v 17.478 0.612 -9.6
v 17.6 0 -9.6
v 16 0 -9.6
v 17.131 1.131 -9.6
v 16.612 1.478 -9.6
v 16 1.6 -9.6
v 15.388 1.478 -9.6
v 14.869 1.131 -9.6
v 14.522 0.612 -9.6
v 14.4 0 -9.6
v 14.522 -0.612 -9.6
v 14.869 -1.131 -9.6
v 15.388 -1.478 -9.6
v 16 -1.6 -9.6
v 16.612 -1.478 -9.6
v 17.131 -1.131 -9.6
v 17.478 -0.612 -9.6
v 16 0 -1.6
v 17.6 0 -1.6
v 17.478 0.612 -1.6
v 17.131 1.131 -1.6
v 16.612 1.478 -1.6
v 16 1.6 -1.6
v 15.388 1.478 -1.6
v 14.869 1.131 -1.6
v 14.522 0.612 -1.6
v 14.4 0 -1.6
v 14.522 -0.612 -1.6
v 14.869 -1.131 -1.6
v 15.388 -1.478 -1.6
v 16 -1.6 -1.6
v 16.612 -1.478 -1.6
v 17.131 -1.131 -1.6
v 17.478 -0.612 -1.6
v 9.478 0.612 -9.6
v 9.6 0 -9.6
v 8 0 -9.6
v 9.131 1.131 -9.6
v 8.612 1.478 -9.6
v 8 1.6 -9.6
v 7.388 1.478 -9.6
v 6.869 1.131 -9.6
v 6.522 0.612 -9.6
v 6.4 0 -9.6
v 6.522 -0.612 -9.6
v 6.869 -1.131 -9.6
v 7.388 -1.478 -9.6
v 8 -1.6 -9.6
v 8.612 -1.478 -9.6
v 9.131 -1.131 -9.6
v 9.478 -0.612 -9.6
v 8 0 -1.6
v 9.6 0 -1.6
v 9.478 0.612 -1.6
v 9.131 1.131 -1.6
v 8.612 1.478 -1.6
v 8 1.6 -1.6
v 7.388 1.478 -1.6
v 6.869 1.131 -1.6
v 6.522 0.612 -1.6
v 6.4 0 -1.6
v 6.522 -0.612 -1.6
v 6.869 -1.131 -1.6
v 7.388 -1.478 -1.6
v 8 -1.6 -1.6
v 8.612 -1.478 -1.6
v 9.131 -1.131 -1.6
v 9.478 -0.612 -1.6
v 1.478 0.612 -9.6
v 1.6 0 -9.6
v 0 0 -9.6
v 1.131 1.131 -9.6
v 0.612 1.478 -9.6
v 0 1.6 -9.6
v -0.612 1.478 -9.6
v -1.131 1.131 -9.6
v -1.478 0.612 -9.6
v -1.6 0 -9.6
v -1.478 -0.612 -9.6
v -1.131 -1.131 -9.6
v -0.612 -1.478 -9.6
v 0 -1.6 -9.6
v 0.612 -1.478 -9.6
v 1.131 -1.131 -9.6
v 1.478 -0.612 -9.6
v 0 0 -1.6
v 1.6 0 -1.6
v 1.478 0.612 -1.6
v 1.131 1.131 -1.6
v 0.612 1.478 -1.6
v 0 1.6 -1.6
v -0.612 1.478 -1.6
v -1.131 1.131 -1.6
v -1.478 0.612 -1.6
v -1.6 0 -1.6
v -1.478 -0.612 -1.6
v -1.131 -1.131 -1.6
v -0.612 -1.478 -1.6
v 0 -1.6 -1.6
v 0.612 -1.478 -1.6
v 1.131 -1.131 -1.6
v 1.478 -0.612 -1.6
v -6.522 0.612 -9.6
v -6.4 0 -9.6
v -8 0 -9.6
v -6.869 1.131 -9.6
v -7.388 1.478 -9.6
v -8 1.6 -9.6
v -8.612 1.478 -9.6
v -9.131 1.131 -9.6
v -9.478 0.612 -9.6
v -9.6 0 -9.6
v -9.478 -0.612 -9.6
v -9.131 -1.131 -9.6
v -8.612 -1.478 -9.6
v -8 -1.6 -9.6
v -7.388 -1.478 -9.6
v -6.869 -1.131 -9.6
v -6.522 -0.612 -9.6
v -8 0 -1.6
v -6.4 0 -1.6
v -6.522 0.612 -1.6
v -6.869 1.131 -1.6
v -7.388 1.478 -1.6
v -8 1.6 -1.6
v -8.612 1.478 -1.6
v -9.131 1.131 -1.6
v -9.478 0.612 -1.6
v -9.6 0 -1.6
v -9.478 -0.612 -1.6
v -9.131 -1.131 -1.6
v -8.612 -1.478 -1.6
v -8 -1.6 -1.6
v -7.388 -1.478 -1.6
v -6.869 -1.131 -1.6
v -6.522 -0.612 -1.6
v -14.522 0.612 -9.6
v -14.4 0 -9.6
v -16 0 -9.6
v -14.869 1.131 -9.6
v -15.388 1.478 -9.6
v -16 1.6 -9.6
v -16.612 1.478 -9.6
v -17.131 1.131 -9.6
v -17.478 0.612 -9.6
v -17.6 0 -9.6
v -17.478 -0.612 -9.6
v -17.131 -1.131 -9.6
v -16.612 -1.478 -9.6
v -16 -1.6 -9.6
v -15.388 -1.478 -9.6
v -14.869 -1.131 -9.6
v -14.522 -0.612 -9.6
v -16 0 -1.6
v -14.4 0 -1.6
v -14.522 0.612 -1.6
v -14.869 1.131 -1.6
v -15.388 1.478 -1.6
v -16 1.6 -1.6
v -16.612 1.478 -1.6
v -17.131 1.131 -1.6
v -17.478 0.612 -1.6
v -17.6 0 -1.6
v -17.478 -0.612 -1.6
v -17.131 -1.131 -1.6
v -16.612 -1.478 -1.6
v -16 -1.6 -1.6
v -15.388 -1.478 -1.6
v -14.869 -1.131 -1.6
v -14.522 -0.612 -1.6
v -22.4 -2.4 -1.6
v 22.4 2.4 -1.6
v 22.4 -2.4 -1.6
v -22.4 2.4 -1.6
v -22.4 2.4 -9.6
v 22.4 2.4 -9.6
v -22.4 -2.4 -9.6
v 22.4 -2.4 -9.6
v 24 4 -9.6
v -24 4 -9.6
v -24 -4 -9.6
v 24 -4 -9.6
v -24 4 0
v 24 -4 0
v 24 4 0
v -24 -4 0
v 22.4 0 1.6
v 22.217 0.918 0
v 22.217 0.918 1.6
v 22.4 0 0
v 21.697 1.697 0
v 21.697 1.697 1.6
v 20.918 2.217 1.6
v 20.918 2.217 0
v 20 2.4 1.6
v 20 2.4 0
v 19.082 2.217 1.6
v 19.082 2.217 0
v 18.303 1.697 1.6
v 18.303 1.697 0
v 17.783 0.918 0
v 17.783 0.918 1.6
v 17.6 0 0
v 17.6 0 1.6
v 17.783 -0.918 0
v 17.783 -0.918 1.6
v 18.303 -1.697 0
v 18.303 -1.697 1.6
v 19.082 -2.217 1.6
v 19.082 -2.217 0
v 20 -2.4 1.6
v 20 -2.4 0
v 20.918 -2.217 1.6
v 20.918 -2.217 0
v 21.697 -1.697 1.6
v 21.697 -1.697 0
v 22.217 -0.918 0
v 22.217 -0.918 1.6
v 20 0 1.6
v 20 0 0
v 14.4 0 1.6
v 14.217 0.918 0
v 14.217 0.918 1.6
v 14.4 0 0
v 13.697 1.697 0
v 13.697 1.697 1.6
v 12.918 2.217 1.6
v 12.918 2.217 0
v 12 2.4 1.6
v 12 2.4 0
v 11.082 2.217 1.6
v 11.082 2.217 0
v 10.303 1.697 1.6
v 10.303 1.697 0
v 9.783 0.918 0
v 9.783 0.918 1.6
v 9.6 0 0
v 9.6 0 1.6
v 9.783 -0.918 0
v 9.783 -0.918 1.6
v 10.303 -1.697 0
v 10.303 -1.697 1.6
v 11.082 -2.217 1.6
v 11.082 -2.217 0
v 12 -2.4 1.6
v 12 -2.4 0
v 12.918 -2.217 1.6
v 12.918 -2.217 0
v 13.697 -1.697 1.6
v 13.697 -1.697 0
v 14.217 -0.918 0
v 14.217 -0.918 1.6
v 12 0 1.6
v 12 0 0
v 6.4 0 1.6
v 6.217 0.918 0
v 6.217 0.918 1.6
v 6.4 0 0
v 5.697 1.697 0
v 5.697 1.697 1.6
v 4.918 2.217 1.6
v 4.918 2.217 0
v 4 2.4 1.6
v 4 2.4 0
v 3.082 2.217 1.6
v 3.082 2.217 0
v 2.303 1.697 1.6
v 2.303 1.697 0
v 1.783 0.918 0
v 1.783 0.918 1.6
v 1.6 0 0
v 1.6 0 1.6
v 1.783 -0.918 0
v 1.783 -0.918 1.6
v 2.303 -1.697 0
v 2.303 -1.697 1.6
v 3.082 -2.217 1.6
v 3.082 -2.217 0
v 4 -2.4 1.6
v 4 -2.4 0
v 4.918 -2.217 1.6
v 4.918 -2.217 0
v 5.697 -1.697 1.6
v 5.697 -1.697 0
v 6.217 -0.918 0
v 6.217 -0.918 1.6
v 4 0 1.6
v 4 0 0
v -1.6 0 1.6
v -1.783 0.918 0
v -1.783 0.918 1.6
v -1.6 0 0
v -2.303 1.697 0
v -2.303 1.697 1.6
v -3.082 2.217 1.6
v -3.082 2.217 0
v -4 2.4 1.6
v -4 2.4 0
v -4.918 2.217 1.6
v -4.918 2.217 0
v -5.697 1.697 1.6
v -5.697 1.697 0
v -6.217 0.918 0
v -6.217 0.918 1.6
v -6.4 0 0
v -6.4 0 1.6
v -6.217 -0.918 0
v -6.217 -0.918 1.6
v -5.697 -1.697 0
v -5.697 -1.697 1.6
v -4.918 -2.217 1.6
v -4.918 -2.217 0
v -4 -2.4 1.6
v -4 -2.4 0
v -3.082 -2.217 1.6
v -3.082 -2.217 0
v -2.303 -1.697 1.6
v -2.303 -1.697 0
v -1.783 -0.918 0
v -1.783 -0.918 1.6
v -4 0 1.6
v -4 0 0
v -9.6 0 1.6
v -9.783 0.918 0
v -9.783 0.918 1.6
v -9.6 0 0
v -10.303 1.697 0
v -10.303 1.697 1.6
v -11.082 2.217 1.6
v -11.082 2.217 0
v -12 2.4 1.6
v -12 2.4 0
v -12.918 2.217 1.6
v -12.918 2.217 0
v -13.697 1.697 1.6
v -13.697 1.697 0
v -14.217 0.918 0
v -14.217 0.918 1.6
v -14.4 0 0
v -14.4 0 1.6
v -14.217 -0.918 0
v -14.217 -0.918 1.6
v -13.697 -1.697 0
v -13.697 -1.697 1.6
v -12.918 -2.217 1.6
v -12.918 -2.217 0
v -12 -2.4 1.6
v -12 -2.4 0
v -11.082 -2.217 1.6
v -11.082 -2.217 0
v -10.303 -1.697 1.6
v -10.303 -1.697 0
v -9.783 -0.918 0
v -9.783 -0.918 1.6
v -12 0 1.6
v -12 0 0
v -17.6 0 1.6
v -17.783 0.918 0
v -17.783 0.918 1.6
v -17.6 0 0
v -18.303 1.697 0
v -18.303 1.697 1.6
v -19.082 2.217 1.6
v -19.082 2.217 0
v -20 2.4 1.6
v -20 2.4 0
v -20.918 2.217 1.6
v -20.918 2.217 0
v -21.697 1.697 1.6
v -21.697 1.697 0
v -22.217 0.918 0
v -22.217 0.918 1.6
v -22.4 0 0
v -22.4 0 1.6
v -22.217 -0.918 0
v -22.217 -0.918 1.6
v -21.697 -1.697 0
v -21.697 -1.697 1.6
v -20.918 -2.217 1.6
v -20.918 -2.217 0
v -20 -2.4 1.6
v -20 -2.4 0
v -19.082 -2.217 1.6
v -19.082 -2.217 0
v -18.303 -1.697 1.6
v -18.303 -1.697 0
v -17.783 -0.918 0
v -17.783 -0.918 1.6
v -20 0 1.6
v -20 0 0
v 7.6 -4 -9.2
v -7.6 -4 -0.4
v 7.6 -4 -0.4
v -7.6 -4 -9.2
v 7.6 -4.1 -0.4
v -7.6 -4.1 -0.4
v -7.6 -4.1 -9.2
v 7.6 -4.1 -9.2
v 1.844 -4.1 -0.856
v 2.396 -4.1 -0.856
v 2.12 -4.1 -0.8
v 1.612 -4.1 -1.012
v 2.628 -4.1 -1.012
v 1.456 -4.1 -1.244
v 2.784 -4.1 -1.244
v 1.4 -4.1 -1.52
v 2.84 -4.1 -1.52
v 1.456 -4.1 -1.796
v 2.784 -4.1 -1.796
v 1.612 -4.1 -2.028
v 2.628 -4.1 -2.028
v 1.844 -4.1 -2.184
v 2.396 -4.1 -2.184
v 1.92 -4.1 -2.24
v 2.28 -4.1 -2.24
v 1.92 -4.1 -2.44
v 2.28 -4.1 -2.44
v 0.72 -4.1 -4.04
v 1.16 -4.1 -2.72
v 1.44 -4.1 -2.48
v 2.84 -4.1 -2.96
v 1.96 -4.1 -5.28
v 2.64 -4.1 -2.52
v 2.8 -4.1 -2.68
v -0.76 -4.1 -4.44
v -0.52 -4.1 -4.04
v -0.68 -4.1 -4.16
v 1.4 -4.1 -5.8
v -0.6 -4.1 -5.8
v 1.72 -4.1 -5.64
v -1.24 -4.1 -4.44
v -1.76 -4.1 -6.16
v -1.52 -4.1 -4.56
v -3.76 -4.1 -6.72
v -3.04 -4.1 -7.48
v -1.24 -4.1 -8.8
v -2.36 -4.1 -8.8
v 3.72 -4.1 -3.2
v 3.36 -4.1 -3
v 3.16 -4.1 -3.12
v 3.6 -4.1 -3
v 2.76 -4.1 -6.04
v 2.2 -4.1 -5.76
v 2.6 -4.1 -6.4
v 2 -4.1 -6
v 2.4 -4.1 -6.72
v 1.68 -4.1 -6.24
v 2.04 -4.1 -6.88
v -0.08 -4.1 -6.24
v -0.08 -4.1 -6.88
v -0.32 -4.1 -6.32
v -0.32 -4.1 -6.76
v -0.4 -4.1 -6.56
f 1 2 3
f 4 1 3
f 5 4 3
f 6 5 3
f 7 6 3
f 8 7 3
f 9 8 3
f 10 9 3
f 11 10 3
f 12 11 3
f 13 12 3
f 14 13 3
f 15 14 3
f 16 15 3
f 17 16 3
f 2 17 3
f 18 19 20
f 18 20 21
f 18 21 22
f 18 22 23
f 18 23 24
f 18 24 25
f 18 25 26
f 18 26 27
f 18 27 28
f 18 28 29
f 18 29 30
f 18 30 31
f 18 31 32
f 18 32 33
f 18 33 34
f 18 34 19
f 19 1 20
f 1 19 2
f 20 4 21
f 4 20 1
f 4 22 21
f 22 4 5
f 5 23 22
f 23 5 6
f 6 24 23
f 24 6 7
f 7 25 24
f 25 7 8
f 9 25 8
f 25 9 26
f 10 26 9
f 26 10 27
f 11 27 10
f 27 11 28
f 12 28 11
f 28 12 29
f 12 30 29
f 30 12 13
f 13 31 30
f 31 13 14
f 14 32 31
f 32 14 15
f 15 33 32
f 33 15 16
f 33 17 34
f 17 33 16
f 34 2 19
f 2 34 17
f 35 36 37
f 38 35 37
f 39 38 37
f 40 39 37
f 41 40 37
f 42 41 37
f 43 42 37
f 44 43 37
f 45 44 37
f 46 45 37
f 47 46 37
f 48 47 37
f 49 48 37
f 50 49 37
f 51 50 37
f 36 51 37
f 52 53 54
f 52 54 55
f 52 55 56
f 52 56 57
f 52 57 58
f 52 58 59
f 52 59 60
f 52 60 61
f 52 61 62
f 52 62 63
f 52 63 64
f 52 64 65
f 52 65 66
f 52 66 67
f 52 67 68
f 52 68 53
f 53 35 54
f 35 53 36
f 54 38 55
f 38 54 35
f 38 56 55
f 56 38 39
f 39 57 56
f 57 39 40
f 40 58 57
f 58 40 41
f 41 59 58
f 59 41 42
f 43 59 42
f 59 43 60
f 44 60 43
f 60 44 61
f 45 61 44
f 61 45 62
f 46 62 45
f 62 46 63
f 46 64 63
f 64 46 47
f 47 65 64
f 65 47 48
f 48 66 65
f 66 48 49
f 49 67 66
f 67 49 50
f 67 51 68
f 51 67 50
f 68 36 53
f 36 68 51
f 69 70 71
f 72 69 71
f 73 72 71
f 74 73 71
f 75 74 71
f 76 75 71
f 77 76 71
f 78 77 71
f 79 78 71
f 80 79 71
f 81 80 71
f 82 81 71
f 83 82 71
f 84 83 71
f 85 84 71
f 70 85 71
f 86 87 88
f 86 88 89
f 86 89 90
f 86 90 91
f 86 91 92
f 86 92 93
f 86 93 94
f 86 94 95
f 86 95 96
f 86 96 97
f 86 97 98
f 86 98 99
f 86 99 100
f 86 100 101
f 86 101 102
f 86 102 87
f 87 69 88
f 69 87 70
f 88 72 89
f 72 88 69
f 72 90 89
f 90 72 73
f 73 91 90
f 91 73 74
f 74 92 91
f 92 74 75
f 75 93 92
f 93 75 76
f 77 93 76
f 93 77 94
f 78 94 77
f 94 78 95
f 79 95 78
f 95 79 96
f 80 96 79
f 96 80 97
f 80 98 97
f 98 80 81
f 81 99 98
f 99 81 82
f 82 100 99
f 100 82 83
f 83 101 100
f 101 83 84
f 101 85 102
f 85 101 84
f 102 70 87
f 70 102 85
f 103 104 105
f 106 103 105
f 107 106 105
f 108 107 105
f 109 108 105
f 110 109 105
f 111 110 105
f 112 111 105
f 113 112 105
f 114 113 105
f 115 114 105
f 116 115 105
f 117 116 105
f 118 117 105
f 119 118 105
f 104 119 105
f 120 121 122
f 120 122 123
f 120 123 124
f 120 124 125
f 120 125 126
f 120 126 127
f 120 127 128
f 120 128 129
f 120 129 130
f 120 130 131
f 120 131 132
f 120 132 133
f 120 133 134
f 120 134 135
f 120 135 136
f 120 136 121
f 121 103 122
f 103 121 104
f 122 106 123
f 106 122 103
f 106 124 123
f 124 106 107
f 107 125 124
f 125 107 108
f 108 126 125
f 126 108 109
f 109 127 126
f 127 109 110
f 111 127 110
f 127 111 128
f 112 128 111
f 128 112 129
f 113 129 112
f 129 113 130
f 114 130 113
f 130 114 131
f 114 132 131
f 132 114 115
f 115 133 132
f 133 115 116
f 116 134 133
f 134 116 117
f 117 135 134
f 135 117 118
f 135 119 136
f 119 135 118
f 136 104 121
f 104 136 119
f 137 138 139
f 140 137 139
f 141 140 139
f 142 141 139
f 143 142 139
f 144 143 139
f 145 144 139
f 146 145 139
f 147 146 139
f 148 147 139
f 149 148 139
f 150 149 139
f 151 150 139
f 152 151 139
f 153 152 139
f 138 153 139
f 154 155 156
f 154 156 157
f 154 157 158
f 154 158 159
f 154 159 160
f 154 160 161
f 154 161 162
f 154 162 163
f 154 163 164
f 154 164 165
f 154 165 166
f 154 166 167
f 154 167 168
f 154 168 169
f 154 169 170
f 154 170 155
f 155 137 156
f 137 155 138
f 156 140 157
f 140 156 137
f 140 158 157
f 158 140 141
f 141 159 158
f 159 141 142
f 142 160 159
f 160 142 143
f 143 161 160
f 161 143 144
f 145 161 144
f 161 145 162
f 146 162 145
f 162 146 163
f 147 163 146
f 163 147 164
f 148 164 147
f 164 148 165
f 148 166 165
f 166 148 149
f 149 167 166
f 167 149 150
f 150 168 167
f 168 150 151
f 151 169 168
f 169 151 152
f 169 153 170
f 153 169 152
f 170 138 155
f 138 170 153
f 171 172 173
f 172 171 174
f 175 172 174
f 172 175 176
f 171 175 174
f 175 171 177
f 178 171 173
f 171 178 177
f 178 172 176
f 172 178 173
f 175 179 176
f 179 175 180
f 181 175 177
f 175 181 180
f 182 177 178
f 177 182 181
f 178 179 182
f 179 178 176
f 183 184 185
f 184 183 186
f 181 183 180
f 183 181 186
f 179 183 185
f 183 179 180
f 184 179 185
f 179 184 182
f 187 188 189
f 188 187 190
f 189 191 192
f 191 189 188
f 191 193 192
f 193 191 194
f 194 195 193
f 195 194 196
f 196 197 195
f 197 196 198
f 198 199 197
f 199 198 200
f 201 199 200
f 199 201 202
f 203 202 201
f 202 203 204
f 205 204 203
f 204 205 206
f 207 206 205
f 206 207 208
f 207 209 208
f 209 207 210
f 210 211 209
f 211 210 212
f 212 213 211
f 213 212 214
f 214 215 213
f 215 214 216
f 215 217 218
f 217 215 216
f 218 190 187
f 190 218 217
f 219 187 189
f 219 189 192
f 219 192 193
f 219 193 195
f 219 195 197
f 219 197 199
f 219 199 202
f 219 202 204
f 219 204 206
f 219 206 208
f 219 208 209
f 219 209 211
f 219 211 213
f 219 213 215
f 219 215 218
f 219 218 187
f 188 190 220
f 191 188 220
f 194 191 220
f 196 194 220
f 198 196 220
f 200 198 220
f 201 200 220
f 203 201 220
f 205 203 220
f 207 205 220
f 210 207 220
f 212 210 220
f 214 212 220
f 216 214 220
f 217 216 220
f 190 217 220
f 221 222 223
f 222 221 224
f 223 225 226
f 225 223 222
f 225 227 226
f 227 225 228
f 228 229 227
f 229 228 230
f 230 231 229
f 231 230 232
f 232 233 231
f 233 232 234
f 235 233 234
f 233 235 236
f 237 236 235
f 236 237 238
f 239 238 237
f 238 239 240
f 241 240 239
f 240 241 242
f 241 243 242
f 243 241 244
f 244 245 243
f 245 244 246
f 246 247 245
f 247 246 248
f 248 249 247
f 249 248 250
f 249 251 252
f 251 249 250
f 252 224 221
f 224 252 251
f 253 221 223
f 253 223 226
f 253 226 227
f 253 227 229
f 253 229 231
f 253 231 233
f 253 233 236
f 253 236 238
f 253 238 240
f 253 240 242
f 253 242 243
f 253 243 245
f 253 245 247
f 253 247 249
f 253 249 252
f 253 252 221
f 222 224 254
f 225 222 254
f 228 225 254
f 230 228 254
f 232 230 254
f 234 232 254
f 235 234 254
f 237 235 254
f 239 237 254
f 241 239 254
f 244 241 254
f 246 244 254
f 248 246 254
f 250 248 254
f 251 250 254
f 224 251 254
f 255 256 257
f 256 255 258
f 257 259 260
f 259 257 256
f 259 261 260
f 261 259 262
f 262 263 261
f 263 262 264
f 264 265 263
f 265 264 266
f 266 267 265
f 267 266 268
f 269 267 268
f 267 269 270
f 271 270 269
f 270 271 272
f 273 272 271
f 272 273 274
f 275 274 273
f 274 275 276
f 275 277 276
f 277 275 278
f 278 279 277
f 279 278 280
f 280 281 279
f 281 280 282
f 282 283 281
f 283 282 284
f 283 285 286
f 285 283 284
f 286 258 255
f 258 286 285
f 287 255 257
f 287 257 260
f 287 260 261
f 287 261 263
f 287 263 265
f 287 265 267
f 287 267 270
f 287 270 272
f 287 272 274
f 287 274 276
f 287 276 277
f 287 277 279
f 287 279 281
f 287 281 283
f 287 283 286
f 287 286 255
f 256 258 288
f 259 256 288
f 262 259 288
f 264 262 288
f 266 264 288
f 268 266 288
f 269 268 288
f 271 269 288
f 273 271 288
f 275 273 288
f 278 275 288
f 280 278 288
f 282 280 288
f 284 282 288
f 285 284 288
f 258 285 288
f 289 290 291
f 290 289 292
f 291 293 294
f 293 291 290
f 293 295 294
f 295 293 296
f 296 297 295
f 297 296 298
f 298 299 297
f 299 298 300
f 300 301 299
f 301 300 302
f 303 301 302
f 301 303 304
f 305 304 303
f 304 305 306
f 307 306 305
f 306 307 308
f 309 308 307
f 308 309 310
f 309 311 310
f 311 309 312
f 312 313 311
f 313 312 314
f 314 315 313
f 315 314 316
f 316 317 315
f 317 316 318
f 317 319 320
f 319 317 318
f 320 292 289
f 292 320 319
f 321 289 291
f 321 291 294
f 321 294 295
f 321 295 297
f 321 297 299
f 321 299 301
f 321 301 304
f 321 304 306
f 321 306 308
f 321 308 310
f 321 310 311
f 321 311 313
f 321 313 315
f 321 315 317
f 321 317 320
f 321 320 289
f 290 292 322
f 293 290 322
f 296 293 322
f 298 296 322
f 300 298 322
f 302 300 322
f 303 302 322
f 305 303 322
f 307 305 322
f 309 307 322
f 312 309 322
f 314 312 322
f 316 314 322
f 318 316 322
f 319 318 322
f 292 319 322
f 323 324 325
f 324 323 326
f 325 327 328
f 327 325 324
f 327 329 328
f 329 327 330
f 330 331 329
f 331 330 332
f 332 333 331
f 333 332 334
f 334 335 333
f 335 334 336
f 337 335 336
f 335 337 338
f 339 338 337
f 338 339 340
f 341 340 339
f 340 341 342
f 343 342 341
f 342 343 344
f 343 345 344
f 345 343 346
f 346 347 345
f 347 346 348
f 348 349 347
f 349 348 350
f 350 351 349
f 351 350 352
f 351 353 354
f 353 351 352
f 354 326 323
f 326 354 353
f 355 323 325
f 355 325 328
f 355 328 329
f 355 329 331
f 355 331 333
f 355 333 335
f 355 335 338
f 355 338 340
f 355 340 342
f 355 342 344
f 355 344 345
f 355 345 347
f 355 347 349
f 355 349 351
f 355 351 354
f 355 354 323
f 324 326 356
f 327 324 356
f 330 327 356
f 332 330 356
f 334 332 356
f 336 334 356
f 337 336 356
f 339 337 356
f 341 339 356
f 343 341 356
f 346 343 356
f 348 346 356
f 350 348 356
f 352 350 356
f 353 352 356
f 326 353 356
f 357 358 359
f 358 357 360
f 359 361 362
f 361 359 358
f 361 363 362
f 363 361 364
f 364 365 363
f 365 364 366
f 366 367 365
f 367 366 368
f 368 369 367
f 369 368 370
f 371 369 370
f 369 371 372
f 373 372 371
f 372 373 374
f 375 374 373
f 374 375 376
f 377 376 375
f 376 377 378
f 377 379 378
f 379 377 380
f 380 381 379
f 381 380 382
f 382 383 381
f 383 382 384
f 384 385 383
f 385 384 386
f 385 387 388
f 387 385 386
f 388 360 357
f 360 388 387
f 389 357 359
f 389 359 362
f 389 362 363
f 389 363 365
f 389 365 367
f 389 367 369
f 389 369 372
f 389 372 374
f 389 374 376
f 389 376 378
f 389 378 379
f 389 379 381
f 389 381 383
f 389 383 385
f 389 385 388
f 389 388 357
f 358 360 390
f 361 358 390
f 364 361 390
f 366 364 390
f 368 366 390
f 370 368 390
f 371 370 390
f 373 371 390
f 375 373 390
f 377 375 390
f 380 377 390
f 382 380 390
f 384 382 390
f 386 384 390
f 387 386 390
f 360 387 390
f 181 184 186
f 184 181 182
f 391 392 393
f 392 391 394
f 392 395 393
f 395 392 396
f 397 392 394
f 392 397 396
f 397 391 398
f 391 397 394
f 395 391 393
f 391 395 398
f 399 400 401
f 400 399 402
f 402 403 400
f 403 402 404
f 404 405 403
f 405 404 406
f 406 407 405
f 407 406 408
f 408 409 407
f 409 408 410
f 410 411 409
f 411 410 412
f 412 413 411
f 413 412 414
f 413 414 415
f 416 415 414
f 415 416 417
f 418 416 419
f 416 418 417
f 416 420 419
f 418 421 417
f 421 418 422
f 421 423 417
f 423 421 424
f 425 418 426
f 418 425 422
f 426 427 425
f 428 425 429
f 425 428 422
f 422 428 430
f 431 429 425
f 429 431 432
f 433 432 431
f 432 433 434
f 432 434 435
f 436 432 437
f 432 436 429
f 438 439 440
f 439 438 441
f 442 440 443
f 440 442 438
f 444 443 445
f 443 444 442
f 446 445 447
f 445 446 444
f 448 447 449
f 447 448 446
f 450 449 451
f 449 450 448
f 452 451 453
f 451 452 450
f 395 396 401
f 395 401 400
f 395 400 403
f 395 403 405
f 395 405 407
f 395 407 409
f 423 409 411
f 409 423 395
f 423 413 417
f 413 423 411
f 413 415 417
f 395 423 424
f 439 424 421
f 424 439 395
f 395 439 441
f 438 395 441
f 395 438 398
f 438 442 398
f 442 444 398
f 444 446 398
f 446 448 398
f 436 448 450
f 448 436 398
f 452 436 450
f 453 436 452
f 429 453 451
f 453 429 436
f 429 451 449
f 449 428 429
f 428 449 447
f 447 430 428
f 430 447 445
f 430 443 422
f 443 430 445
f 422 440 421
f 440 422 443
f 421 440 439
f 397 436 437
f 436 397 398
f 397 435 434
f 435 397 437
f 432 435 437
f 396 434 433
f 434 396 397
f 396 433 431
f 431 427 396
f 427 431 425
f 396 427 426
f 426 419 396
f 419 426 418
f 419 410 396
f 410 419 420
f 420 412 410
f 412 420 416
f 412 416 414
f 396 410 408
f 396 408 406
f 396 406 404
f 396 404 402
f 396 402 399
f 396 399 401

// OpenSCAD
// file: ../p/4-4edge.scad
use <../lib.scad>
function ldraw_lib__4_4edge() = [
// 0 Circle 1.0
// 0 Name: 4-4edge.dat
// 0 Author: James Jessiman
// 0 !LDRAW_ORG Primitive UPDATE 2017-01
// 0 !LICENSE Licensed under CC BY 2.0 and CC BY 4.0 : see CAreadme.txt
// 
// 0 BFC CERTIFY CCW
  [0,"BFC","CERTIFY"],
  [0,"BFC","CCW"],
// 
// 0 !HISTORY 1998-12-15 [PTadmin] Official Update 1998-10
// 0 !HISTORY 2005-12-28 [PTadmin] Official Update 2005-01
// 0 !HISTORY 2007-06-24 [PTadmin] Header formatted for Contributor Agreement
// 0 !HISTORY 2008-07-01 [PTadmin] Official Update 2008-01
// 0 !HISTORY 2017-01-15 [Steffen] BFCed
// 0 !HISTORY 2017-12-30 [PTadmin] Official Update 2017-01
// 
// 
// 2 24 1 0 0 0.9239 0 0.3827
  [2,24,1,0,0,0.9239,0,0.3827],
// 2 24 0.9239 0 0.3827 0.7071 0 0.7071
  [2,24,0.9239,0,0.3827,0.7071,0,0.7071],
// 2 24 0.7071 0 0.7071 0.3827 0 0.9239
  [2,24,0.7071,0,0.7071,0.3827,0,0.9239],
// 2 24 0.3827 0 0.9239 0 0 1
  [2,24,0.3827,0,0.9239,0,0,1],
// 2 24 0 0 1 -0.3827 0 0.9239
  [2,24,0,0,1,-0.3827,0,0.9239],
// 2 24 -0.3827 0 0.9239 -0.7071 0 0.7071
  [2,24,-0.3827,0,0.9239,-0.7071,0,0.7071],
// 2 24 -0.7071 0 0.7071 -0.9239 0 0.3827
  [2,24,-0.7071,0,0.7071,-0.9239,0,0.3827],
// 2 24 -0.9239 0 0.3827 -1 0 -0
  [2,24,-0.9239,0,0.3827,-1,0,-0],
// 2 24 -1 0 -0 -0.9239 0 -0.3827
  [2,24,-1,0,-0,-0.9239,0,-0.3827],
// 2 24 -0.9239 0 -0.3827 -0.7071 0 -0.7071
  [2,24,-0.9239,0,-0.3827,-0.7071,0,-0.7071],
// 2 24 -0.7071 0 -0.7071 -0.3827 0 -0.9239
  [2,24,-0.7071,0,-0.7071,-0.3827,0,-0.9239],
// 2 24 -0.3827 0 -0.9239 0 0 -1
  [2,24,-0.3827,0,-0.9239,0,0,-1],
// 2 24 0 0 -1 0.3827 0 -0.9239
  [2,24,0,0,-1,0.3827,0,-0.9239],
// 2 24 0.3827 0 -0.9239 0.7071 0 -0.7071
  [2,24,0.3827,0,-0.9239,0.7071,0,-0.7071],
// 2 24 0.7071 0 -0.7071 0.9239 0 -0.3827
  [2,24,0.7071,0,-0.7071,0.9239,0,-0.3827],
// 2 24 0.9239 0 -0.3827 1 0 0
  [2,24,0.9239,0,-0.3827,1,0,0],
];
module ldraw_lib__4_4edge(step=0, col=false, unit=2/5, alt=false, line=0.2, solid=!$preview)
    makepoly(ldraw_lib__4_4edge(), step=step, col=col, unit=unit, alt=alt, line=line, solid=solid);
ldraw_lib__4_4edge(line=0.2);
// file: ../p/4-4disc.scad
use <../lib.scad>
function ldraw_lib__4_4disc() = [
// 0 Disc 1.0
// 0 Name: 4-4disc.dat
// 0 Author: James Jessiman
// 0 !LDRAW_ORG Primitive UPDATE 2002-02
// 0 !LICENSE Licensed under CC BY 2.0 and CC BY 4.0 : see CAreadme.txt
// 
// 0 BFC CERTIFY CCW
  [0,"BFC","CERTIFY"],
  [0,"BFC","CCW"],
// 
// 0 !HISTORY 1998-12-15 [PTadmin] Official Update 1998-10
// 0 !HISTORY 2002-03-23 [sbliss] Added BFC statement
// 0 !HISTORY 2002-04-25 [PTadmin] Official Update 2002-02
// 0 !HISTORY 2007-06-24 [PTadmin] Header formatted for Contributor Agreement
// 0 !HISTORY 2008-07-01 [PTadmin] Official Update 2008-01
// 
// 
// 3 16 0 0 0 1 0 0 0.9239 0 0.3827
  [3,16,0,0,0,1,0,0,0.9239,0,0.3827],
// 3 16 0 0 0 0.9239 0 0.3827 0.7071 0 0.7071
  [3,16,0,0,0,0.9239,0,0.3827,0.7071,0,0.7071],
// 3 16 0 0 0 0.7071 0 0.7071 0.3827 0 0.9239
  [3,16,0,0,0,0.7071,0,0.7071,0.3827,0,0.9239],
// 3 16 0 0 0 0.3827 0 0.9239 0 0 1
  [3,16,0,0,0,0.3827,0,0.9239,0,0,1],
// 3 16 0 0 0 0 0 1 -0.3827 0 0.9239
  [3,16,0,0,0,0,0,1,-0.3827,0,0.9239],
// 3 16 0 0 0 -0.3827 0 0.9239 -0.7071 0 0.7071
  [3,16,0,0,0,-0.3827,0,0.9239,-0.7071,0,0.7071],
// 3 16 0 0 0 -0.7071 0 0.7071 -0.9239 0 0.3827
  [3,16,0,0,0,-0.7071,0,0.7071,-0.9239,0,0.3827],
// 3 16 0 0 0 -0.9239 0 0.3827 -1 0 -0
  [3,16,0,0,0,-0.9239,0,0.3827,-1,0,-0],
// 3 16 0 0 0 -1 0 -0 -0.9239 0 -0.3827
  [3,16,0,0,0,-1,0,-0,-0.9239,0,-0.3827],
// 3 16 0 0 0 -0.9239 0 -0.3827 -0.7071 0 -0.7071
  [3,16,0,0,0,-0.9239,0,-0.3827,-0.7071,0,-0.7071],
// 3 16 0 0 0 -0.7071 0 -0.7071 -0.3827 0 -0.9239
  [3,16,0,0,0,-0.7071,0,-0.7071,-0.3827,0,-0.9239],
// 3 16 0 0 0 -0.3827 0 -0.9239 0 0 -1
  [3,16,0,0,0,-0.3827,0,-0.9239,0,0,-1],
// 3 16 0 0 0 0 0 -1 0.3827 0 -0.9239
  [3,16,0,0,0,0,0,-1,0.3827,0,-0.9239],
// 3 16 0 0 0 0.3827 0 -0.9239 0.7071 0 -0.7071
  [3,16,0,0,0,0.3827,0,-0.9239,0.7071,0,-0.7071],
// 3 16 0 0 0 0.7071 0 -0.7071 0.9239 0 -0.3827
  [3,16,0,0,0,0.7071,0,-0.7071,0.9239,0,-0.3827],
// 3 16 0 0 0 0.9239 0 -0.3827 1 0 0
  [3,16,0,0,0,0.9239,0,-0.3827,1,0,0],
// 0
];
module ldraw_lib__4_4disc(step=0, col=false, unit=2/5, alt=false, line=0.2, solid=!$preview)
    makepoly(ldraw_lib__4_4disc(), step=step, col=col, unit=unit, alt=alt, line=line, solid=solid);
ldraw_lib__4_4disc(line=0.2);
// file: ../p/4-4cyli.scad
use <../lib.scad>
$fa=1; $fs=0.2;
function ldraw_lib__4_4cyli(realsolid=false) = [
// 0 Cylinder 1.0
// 0 Name: 4-4cyli.dat
// 0 Author: James Jessiman
// 0 !LDRAW_ORG Primitive UPDATE 2005-01
// 0 !LICENSE Licensed under CC BY 2.0 and CC BY 4.0 : see CAreadme.txt
// 
// 0 BFC CERTIFY CCW
  [0,"BFC","CERTIFY"],
  [0,"BFC","CCW"],
// 
// 0 !HISTORY 1998-12-15 [PTadmin] Official Update 1998-10
// 0 !HISTORY 2002-03-23 [sbliss] Added BFC statement; merged headers from files in distributions LDraw 0.27 and Complete.
// 0 !HISTORY 2002-04-25 [PTadmin] Official Update 2002-02
// 0 !HISTORY 2004-12-14 [guyvivan] BFC CCW
// 0 !HISTORY 2005-12-28 [PTadmin] Official Update 2005-01
// 0 !HISTORY 2007-06-24 [PTadmin] Header formatted for Contributor Agreement
// 0 !HISTORY 2008-07-01 [PTadmin] Official Update 2008-01
// 
// 
// 4 16 1 1 0 0.9239 1 0.3827 0.9239 0 0.3827 1 0 0
  [4,16,1,1,0,0.9239,1,0.3827,0.9239,0,0.3827,1,0,0],
// 5 24 1 0 0 1 1 0 0.9239 0 0.3827 0.9239 0 -0.3827
  [5,24,1,0,0,1,1,0,0.9239,0,0.3827,0.9239,0,-0.3827],
// 4 16 0.9239 1 0.3827 0.7071 1 0.7071 0.7071 0 0.7071 0.9239 0 0.3827
  [4,16,0.9239,1,0.3827,0.7071,1,0.7071,0.7071,0,0.7071,0.9239,0,0.3827],
// 5 24 0.9239 0 0.3827 0.9239 1 0.3827 0.7071 0 0.7071 1 0 0
  [5,24,0.9239,0,0.3827,0.9239,1,0.3827,0.7071,0,0.7071,1,0,0],
// 4 16 0.7071 1 0.7071 0.3827 1 0.9239 0.3827 0 0.9239 0.7071 0 0.7071
  [4,16,0.7071,1,0.7071,0.3827,1,0.9239,0.3827,0,0.9239,0.7071,0,0.7071],
// 5 24 0.7071 0 0.7071 0.7071 1 0.7071 0.3827 0 0.9239 0.9239 0 0.3827
  [5,24,0.7071,0,0.7071,0.7071,1,0.7071,0.3827,0,0.9239,0.9239,0,0.3827],
// 4 16 0.3827 1 0.9239 0 1 1 0 0 1 0.3827 0 0.9239
  [4,16,0.3827,1,0.9239,0,1,1,0,0,1,0.3827,0,0.9239],
// 5 24 0.3827 0 0.9239 0.3827 1 0.9239 0 0 1 0.7071 0 0.7071
  [5,24,0.3827,0,0.9239,0.3827,1,0.9239,0,0,1,0.7071,0,0.7071],
// 4 16 0 1 1 -0.3827 1 0.9239 -0.3827 0 0.9239 0 0 1
  [4,16,0,1,1,-0.3827,1,0.9239,-0.3827,0,0.9239,0,0,1],
// 5 24 0 0 1 0 1 1 -0.3827 0 0.9239 0.3827 0 0.9239
  [5,24,0,0,1,0,1,1,-0.3827,0,0.9239,0.3827,0,0.9239],
// 4 16 -0.3827 1 0.9239 -0.7071 1 0.7071 -0.7071 0 0.7071 -0.3827 0 0.9239
  [4,16,-0.3827,1,0.9239,-0.7071,1,0.7071,-0.7071,0,0.7071,-0.3827,0,0.9239],
// 5 24 -0.3827 0 0.9239 -0.3827 1 0.9239 -0.7071 0 0.7071 0 0 1
  [5,24,-0.3827,0,0.9239,-0.3827,1,0.9239,-0.7071,0,0.7071,0,0,1],
// 4 16 -0.7071 1 0.7071 -0.9239 1 0.3827 -0.9239 0 0.3827 -0.7071 0 0.7071
  [4,16,-0.7071,1,0.7071,-0.9239,1,0.3827,-0.9239,0,0.3827,-0.7071,0,0.7071],
// 5 24 -0.7071 0 0.7071 -0.7071 1 0.7071 -0.9239 0 0.3827 -0.3827 0 0.9239
  [5,24,-0.7071,0,0.7071,-0.7071,1,0.7071,-0.9239,0,0.3827,-0.3827,0,0.9239],
// 4 16 -0.9239 1 0.3827 -1 1 0 -1 0 0 -0.9239 0 0.3827
  [4,16,-0.9239,1,0.3827,-1,1,0,-1,0,0,-0.9239,0,0.3827],
// 5 24 -0.9239 0 0.3827 -0.9239 1 0.3827 -1 0 0 -0.7071 0 0.7071
  [5,24,-0.9239,0,0.3827,-0.9239,1,0.3827,-1,0,0,-0.7071,0,0.7071],
// 4 16 -1 1 0 -0.9239 1 -0.3827 -0.9239 0 -0.3827 -1 0 0
  [4,16,-1,1,0,-0.9239,1,-0.3827,-0.9239,0,-0.3827,-1,0,0],
// 5 24 -1 0 0 -1 1 0 -0.9239 0 -0.3827 -0.9239 0 0.3827
  [5,24,-1,0,0,-1,1,0,-0.9239,0,-0.3827,-0.9239,0,0.3827],
// 4 16 -0.9239 1 -0.3827 -0.7071 1 -0.7071 -0.7071 0 -0.7071 -0.9239 0 -0.3827
  [4,16,-0.9239,1,-0.3827,-0.7071,1,-0.7071,-0.7071,0,-0.7071,-0.9239,0,-0.3827],
// 5 24 -0.9239 0 -0.3827 -0.9239 1 -0.3827 -0.7071 0 -0.7071 -1 0 0
  [5,24,-0.9239,0,-0.3827,-0.9239,1,-0.3827,-0.7071,0,-0.7071,-1,0,0],
// 4 16 -0.7071 1 -0.7071 -0.3827 1 -0.9239 -0.3827 0 -0.9239 -0.7071 0 -0.7071
  [4,16,-0.7071,1,-0.7071,-0.3827,1,-0.9239,-0.3827,0,-0.9239,-0.7071,0,-0.7071],
// 5 24 -0.7071 0 -0.7071 -0.7071 1 -0.7071 -0.3827 0 -0.9239 -0.9239 0 -0.3827
  [5,24,-0.7071,0,-0.7071,-0.7071,1,-0.7071,-0.3827,0,-0.9239,-0.9239,0,-0.3827],
// 4 16 -0.3827 1 -0.9239 0 1 -1 0 0 -1 -0.3827 0 -0.9239
  [4,16,-0.3827,1,-0.9239,0,1,-1,0,0,-1,-0.3827,0,-0.9239],
// 5 24 -0.3827 0 -0.9239 -0.3827 1 -0.9239 0 0 -1 -0.7071 0 -0.7071
  [5,24,-0.3827,0,-0.9239,-0.3827,1,-0.9239,0,0,-1,-0.7071,0,-0.7071],
// 4 16 0 1 -1 0.3827 1 -0.9239 0.3827 0 -0.9239 0 0 -1
  [4,16,0,1,-1,0.3827,1,-0.9239,0.3827,0,-0.9239,0,0,-1],
// 5 24 0 0 -1 0 1 -1 0.3827 0 -0.9239 -0.3827 0 -0.9239
  [5,24,0,0,-1,0,1,-1,0.3827,0,-0.9239,-0.3827,0,-0.9239],
// 4 16 0.3827 1 -0.9239 0.7071 1 -0.7071 0.7071 0 -0.7071 0.3827 0 -0.9239
  [4,16,0.3827,1,-0.9239,0.7071,1,-0.7071,0.7071,0,-0.7071,0.3827,0,-0.9239],
// 5 24 0.3827 0 -0.9239 0.3827 1 -0.9239 0.7071 0 -0.7071 0 0 -1
  [5,24,0.3827,0,-0.9239,0.3827,1,-0.9239,0.7071,0,-0.7071,0,0,-1],
// 4 16 0.7071 1 -0.7071 0.9239 1 -0.3827 0.9239 0 -0.3827 0.7071 0 -0.7071
  [4,16,0.7071,1,-0.7071,0.9239,1,-0.3827,0.9239,0,-0.3827,0.7071,0,-0.7071],
// 5 24 0.7071 0 -0.7071 0.7071 1 -0.7071 0.9239 0 -0.3827 0.3827 0 -0.9239
  [5,24,0.7071,0,-0.7071,0.7071,1,-0.7071,0.9239,0,-0.3827,0.3827,0,-0.9239],
// 4 16 0.9239 1 -0.3827 1 1 0 1 0 0 0.9239 0 -0.3827
  [4,16,0.9239,1,-0.3827,1,1,0,1,0,0,0.9239,0,-0.3827],
// 5 24 0.9239 0 -0.3827 0.9239 1 -0.3827 1 0 0 0.7071 0 -0.7071
  [5,24,0.9239,0,-0.3827,0.9239,1,-0.3827,1,0,0,0.7071,0,-0.7071],
// 0
];
module ldraw_lib__4_4cyli(step=0, col=false, unit=2/5, alt=false, line=0.2, solid=!$preview)
    makepoly(ldraw_lib__4_4cyli(solid), step=step, col=col, unit=unit, alt=alt, line=line, solid=solid);
ldraw_lib__4_4cyli(line=0.2);
// file: ../p/stud3.scad
use <../lib.scad>
use <4-4cyli.scad>
use <4-4disc.scad>
use <4-4edge.scad>
function ldraw_lib__stud3() = [
// 0 Stud Tube Solid
// 0 Name: stud3.dat
// 0 Author: James Jessiman
// 0 !LDRAW_ORG Primitive UPDATE 2012-01
// 0 !LICENSE Licensed under CC BY 4.0 : see CAreadme.txt
// 
// 0 BFC CERTIFY CCW
  [0,"BFC","CERTIFY"],
  [0,"BFC","CCW"],
// 
// 0 !HISTORY 2002-04-04 [sbliss] Modified for BFC compliance
// 0 !HISTORY 2002-04-25 [PTadmin] Official Update 2002-02
// 0 !HISTORY 2007-06-24 [PTadmin] Header formatted for Contributor Agreement
// 0 !HISTORY 2008-07-01 [PTadmin] Official Update 2008-01
// 0 !HISTORY 2012-02-16 [Philo] Changed to CCW
// 0 !HISTORY 2012-03-30 [PTadmin] Official Update 2012-01
// 
// 
// 1 16 0 -4 0 4 0 0 0 1 0 0 0 4 4-4edge.dat
  [1,16,0,-4,0,4,0,0,0,1,0,0,0,4, ldraw_lib__4_4edge()],
// 1 16 0 0 0 4 0 0 0 1 0 0 0 4 4-4edge.dat
  [1,16,0,0,0,4,0,0,0,1,0,0,0,4, ldraw_lib__4_4edge()],
// 1 16 0 -4 0 4 0 0 0 1 0 0 0 4 4-4disc.dat
  [1,16,0,-4,0,4,0,0,0,1,0,0,0,4, ldraw_lib__4_4disc()],
  [-1,16,0,0,0,4,0,0,0,-1,0,0,0,4, ldraw_lib__4_4disc()],
// 1 16 0 -4 0 4 0 0 0 4 0 0 0 4 4-4cyli.dat
  [1,16,0,-4,0,4,0,0,0,4,0,0,0,4, ldraw_lib__4_4cyli()],
];
module ldraw_lib__stud3(step=0, col=false, unit=2/5, alt=false, line=0.2, solid=!$preview)
    makepoly(ldraw_lib__stud3(), step=step, col=col, unit=unit, alt=alt, line=line, solid=solid);
ldraw_lib__stud3(line=0.2);
// file: ../p/stud.scad
use <../lib.scad>
use <4-4cyli.scad>
use <4-4disc.scad>
use <4-4edge.scad>
function ldraw_lib__stud() = [
// 0 Stud
// 0 Name: stud.dat
// 0 Author: James Jessiman
// 0 !LDRAW_ORG Primitive UPDATE 2012-01
// 0 !LICENSE Licensed under CC BY 4.0 : see CAreadme.txt
// 
// 0 BFC CERTIFY CCW
  [0,"BFC","CERTIFY"],
  [0,"BFC","CCW"],
// 
// 0 !HISTORY 2002-04-04 [sbliss] Modified for BFC compliance
// 0 !HISTORY 2002-04-25 [PTadmin] Official Update 2002-02
// 0 !HISTORY 2007-06-24 [PTadmin] Header formatted for Contributor Agreement
// 0 !HISTORY 2008-07-01 [PTadmin] Official Update 2008-01
// 0 !HISTORY 2012-02-16 [Philo] Changed to CCW
// 0 !HISTORY 2012-03-30 [PTadmin] Official Update 2012-01
// 
// 
// 1 16 0 0 0 6 0 0 0 1 0 0 0 6 4-4edge.dat
  [1,16,0,0,0,6,0,0,0,1,0,0,0,6, ldraw_lib__4_4edge()],
// 1 16 0 -4 0 6 0 0 0 1 0 0 0 6 4-4edge.dat
  [1,16,0,-4,0,6,0,0,0,1,0,0,0,6, ldraw_lib__4_4edge()],
// 1 16 0 0 0 6 0 0 0 -4 0 0 0 6 4-4cyli.dat
  [1,16,0,0,0,6,0,0,0,-4,0,0,0,6, ldraw_lib__4_4cyli()],
// 1 16 0 -4 0 6 0 0 0 1 0 0 0 6 4-4disc.dat
  [1,16,0,-4,0,6,0,0,0,1,0,0,0,6, ldraw_lib__4_4disc()],
  [-1,16,0,0,0,6,0,0,0,-1,0,0,0,6, ldraw_lib__4_4disc()],
];
module ldraw_lib__stud(step=0, col=false, unit=2/5, alt=false, line=0.2, solid=!$preview)
    makepoly(ldraw_lib__stud(), step=step, col=col, unit=unit, alt=alt, line=line, solid=solid);
ldraw_lib__stud(line=0.2);
// file: ../p/box5.scad
use <../lib.scad>
function ldraw_lib__box5() = [
// 0 Box with 5 Faces and All Edges
// 0 Name: box5.dat
// 0 Author: James Jessiman
// 0 !LDRAW_ORG Primitive UPDATE 2012-01
// 0 !LICENSE Licensed under CC BY 2.0 and CC BY 4.0 : see CAreadme.txt
// 
// 0 BFC CERTIFY CCW
  [0,"BFC","CERTIFY"],
  [0,"BFC","CCW"],
// 
// 0 !HISTORY 2002-04-03 [sbliss] Modified for BFC compliance
// 0 !HISTORY 2002-04-25 [PTadmin] Official Update 2002-02
// 0 !HISTORY 2007-06-24 [PTadmin] Header formatted for Contributor Agreement
// 0 !HISTORY 2008-07-01 [PTadmin] Official Update 2008-01
// 0 !HISTORY 2012-02-16 [Philo] Changed to CCW
// 0 !HISTORY 2012-03-30 [PTadmin] Official Update 2012-01
// 
// 
// 2 24 1 1 1 -1 1 1
  [2,24,1,1,1,-1,1,1],
// 2 24 -1 1 1 -1 1 -1
  [2,24,-1,1,1,-1,1,-1],
// 2 24 -1 1 -1 1 1 -1
  [2,24,-1,1,-1,1,1,-1],
// 2 24 1 1 -1 1 1 1
  [2,24,1,1,-1,1,1,1],
// 2 24 1 0 1 -1 0 1
  [2,24,1,0,1,-1,0,1],
// 2 24 -1 0 1 -1 0 -1
  [2,24,-1,0,1,-1,0,-1],
// 2 24 -1 0 -1 1 0 -1
  [2,24,-1,0,-1,1,0,-1],
// 2 24 1 0 -1 1 0 1
  [2,24,1,0,-1,1,0,1],
// 2 24 1 0 1 1 1 1
  [2,24,1,0,1,1,1,1],
// 2 24 -1 0 1 -1 1 1
  [2,24,-1,0,1,-1,1,1],
// 2 24 1 0 -1 1 1 -1
  [2,24,1,0,-1,1,1,-1],
// 2 24 -1 0 -1 -1 1 -1
  [2,24,-1,0,-1,-1,1,-1],
// 4 16 -1 1 1 1 1 1 1 1 -1 -1 1 -1
  [4,16,-1,1,1,1,1,1,1,1,-1,-1,1,-1],
// 4 16 -1 1 1 -1 0 1 1 0 1 1 1 1
  [4,16,-1,1,1,-1,0,1,1,0,1,1,1,1],
// 4 16 -1 1 -1 -1 0 -1 -1 0 1 -1 1 1
  [4,16,-1,1,-1,-1,0,-1,-1,0,1,-1,1,1],
// 4 16 1 1 -1 1 0 -1 -1 0 -1 -1 1 -1
  [4,16,1,1,-1,1,0,-1,-1,0,-1,-1,1,-1],
// 4 16 1 1 1 1 0 1 1 0 -1 1 1 -1
  [4,16,1,1,1,1,0,1,1,0,-1,1,1,-1],
];
makepoly(ldraw_lib__box5(), line=0.2);
// file: s/3009s01.scad
use <../../lib.scad>
use <../../p/box5.scad>
use <../../p/stud.scad>
use <../../p/stud3.scad>
$fa=1; $fs=0.2;
function ldraw_lib__s__3009s01(realsolid=false) = [
// 0 ~Brick  1 x  6 without Front Face
// 0 Name: s\3009s01.dat
// 0 Author: James Jessiman
// 0 !LDRAW_ORG Subpart UPDATE 2003-03
// 0 !LICENSE Licensed under CC BY 2.0 and CC BY 4.0 : see CAreadme.txt
// 
// 0 BFC CERTIFY CCW
  [0,"BFC","CERTIFY"],
  [0,"BFC","CCW"],
// 
// 0 !HISTORY 2002-05-07 {unknown} BFC Certification
// 0 !HISTORY 2003-07-03 [Steffen] Subfiled for patterning
// 0 !HISTORY 2003-12-19 [PTadmin] Official Update 2003-03
// 0 !HISTORY 2007-08-29 [PTadmin] Header formatted for Contributor Agreement
// 0 !HISTORY 2008-07-01 [PTadmin] Official Update 2008-01
// 
// 
// 1 16 40 4 0 1 0 0 0 -5 0 0 0 1 stud3.dat
  [1,16,40,4,0,1,0,0,0,-5,0,0,0,1, ldraw_lib__stud3(realsolid)],
// 1 16 20 4 0 1 0 0 0 -5 0 0 0 1 stud3.dat
  [1,16,20,4,0,1,0,0,0,-5,0,0,0,1, ldraw_lib__stud3(realsolid)],
// 1 16 0 4 0 1 0 0 0 -5 0 0 0 1 stud3.dat
  [1,16,0,4,0,1,0,0,0,-5,0,0,0,1, ldraw_lib__stud3(realsolid)],
// 1 16 -20 4 0 1 0 0 0 -5 0 0 0 1 stud3.dat
  [1,16,-20,4,0,1,0,0,0,-5,0,0,0,1, ldraw_lib__stud3(realsolid)],
// 1 16 -40 4 0 1 0 0 0 -5 0 0 0 1 stud3.dat
  [1,16,-40,4,0,1,0,0,0,-5,0,0,0,1, ldraw_lib__stud3(realsolid)],
// 0 BFC INVERTNEXT
  [0,"BFC","INVERTNEXT"],
// 1 16 0 24 0 56 0 0 0 -20 0 0 0 6 box5.dat
  [1,16,0,24,0,56,0,0,0,-20,0,0,0,6, ldraw_lib__box5(realsolid)],
// 4 16 60 24 10 56 24 6 -56 24 6 -60 24 10
  [4,16,60,24,10,56,24,6,-56,24,6,-60,24,10],
// 4 16 -60 24 10 -56 24 6 -56 24 -6 -60 24 -10
  [4,16,-60,24,10,-56,24,6,-56,24,-6,-60,24,-10],
// 4 16 -60 24 -10 -56 24 -6 56 24 -6 60 24 -10
  [4,16,-60,24,-10,-56,24,-6,56,24,-6,60,24,-10],
// 4 16 60 24 -10 56 24 -6 56 24 6 60 24 10
  [4,16,60,24,-10,56,24,-6,56,24,6,60,24,10],
// 2 24 60 0 10 -60 0 10
  [2,24,60,0,10,-60,0,10],
// 2 24 -60 0 10 -60 0 -10
  [2,24,-60,0,10,-60,0,-10],
// 2 24 -60 0 -10 60 0 -10
  [2,24,-60,0,-10,60,0,-10],
// 2 24 60 0 -10 60 0 10
  [2,24,60,0,-10,60,0,10],
// 2 24 60 24 10 -60 24 10
  [2,24,60,24,10,-60,24,10],
// 2 24 -60 24 10 -60 24 -10
  [2,24,-60,24,10,-60,24,-10],
// 2 24 -60 24 -10 60 24 -10
  [2,24,-60,24,-10,60,24,-10],
// 2 24 60 24 -10 60 24 10
  [2,24,60,24,-10,60,24,10],
// 2 24 60 24 10 60 0 10
  [2,24,60,24,10,60,0,10],
// 2 24 -60 24 10 -60 0 10
  [2,24,-60,24,10,-60,0,10],
// 2 24 60 24 -10 60 0 -10
  [2,24,60,24,-10,60,0,-10],
// 2 24 -60 24 -10 -60 0 -10
  [2,24,-60,24,-10,-60,0,-10],
// 4 16 -60 0 -10 60 0 -10 60 0 10 -60 0 10
  [4,16,-60,0,-10,60,0,-10,60,0,10,-60,0,10],
// 4 16 -60 0 10 -60 24 10 -60 24 -10 -60 0 -10
  [4,16,-60,0,10,-60,24,10,-60,24,-10,-60,0,-10],
// 4 16 60 0 10 60 24 10 -60 24 10 -60 0 10
  [4,16,60,0,10,60,24,10,-60,24,10,-60,0,10],
// 4 16 60 0 -10 60 24 -10 60 24 10 60 0 10
  [4,16,60,0,-10,60,24,-10,60,24,10,60,0,10],
// 1 16 50 0 0 1 0 0 0 1 0 0 0 1 stud.dat
  [1,16,50,0,0,1,0,0,0,1,0,0,0,1, ldraw_lib__stud(realsolid)],
// 1 16 30 0 0 1 0 0 0 1 0 0 0 1 stud.dat
  [1,16,30,0,0,1,0,0,0,1,0,0,0,1, ldraw_lib__stud(realsolid)],
// 1 16 10 0 0 1 0 0 0 1 0 0 0 1 stud.dat
  [1,16,10,0,0,1,0,0,0,1,0,0,0,1, ldraw_lib__stud(realsolid)],
// 1 16 -10 0 0 1 0 0 0 1 0 0 0 1 stud.dat
  [1,16,-10,0,0,1,0,0,0,1,0,0,0,1, ldraw_lib__stud(realsolid)],
// 1 16 -30 0 0 1 0 0 0 1 0 0 0 1 stud.dat
  [1,16,-30,0,0,1,0,0,0,1,0,0,0,1, ldraw_lib__stud(realsolid)],
// 1 16 -50 0 0 1 0 0 0 1 0 0 0 1 stud.dat
  [1,16,-50,0,0,1,0,0,0,1,0,0,0,1, ldraw_lib__stud(realsolid)],
// 0
];
module ldraw_lib__s__3009s01(step=0, col=false, unit=2/5, alt=false, line=0.2, solid=!$preview)
    makepoly(ldraw_lib__s__3009s01(solid), step=step, col=col, unit=unit, alt=alt, line=line, solid=solid);
ldraw_lib__s__3009s01(line=0.2);
// file: ../p/box5-12.scad
use <../lib.scad>
function ldraw_lib__box5_12() = [
// 0 Box with 5 Faces without Any Edges
// 0 Name: box5-12.dat
// 0 Author: Chris Dee [cwdee]
// 0 !LDRAW_ORG Primitive UPDATE 2009-02
// 0 !LICENSE Licensed under CC BY 2.0 and CC BY 4.0 : see CAreadme.txt
// 
// 0 BFC CERTIFY CCW
  [0,"BFC","CERTIFY"],
  [0,"BFC","CCW"],
// 
// 0 !HISTORY 2009-09-03 [PTadmin] Official Update 2009-02
// 
// 
// 4 16 1 1 1 1 1 -1 -1 1 -1 -1 1 1
  [4,16,1,1,1,1,1,-1,-1,1,-1,-1,1,1],
// 4 16 -1 0 1 1 0 1 1 1 1 -1 1 1
  [4,16,-1,0,1,1,0,1,1,1,1,-1,1,1],
// 4 16 -1 0 -1 -1 0 1 -1 1 1 -1 1 -1
  [4,16,-1,0,-1,-1,0,1,-1,1,1,-1,1,-1],
// 4 16 1 0 -1 -1 0 -1 -1 1 -1 1 1 -1
  [4,16,1,0,-1,-1,0,-1,-1,1,-1,1,1,-1],
// 4 16 1 0 1 1 0 -1 1 1 -1 1 1 1
  [4,16,1,0,1,1,0,-1,1,1,-1,1,1,1],
// 0
];
module ldraw_lib__box5_12(step=0, col=false, unit=2/5, alt=false, line=0.2, solid=!$preview)
    makepoly(ldraw_lib__box5_12(), step=step, col=col, unit=unit, alt=alt, line=line, solid=solid);
ldraw_lib__box5_12(line=0.2);
// file: 3009.scad
use <../lib.scad>
use <s/3009s01.scad>
function ldraw_lib__3009() = [
// 0 Brick  1 x  6
// 0 Name: 3009.dat
// 0 Author: James Jessiman
// 0 !LDRAW_ORG Part UPDATE 2003-03
// 0 !LICENSE Licensed under CC BY 4.0 : see CAreadme.txt
// 
// 0 BFC CERTIFY CCW
  [0,"BFC","CERTIFY"],
  [0,"BFC","CCW"],
// 
// 0 !HISTORY 2001-10-26 [PTadmin] Official Update 2001-01
// 0 !HISTORY 2002-05-07 {unknown} BFC Certification
// 0 !HISTORY 2002-06-11 [PTadmin] Official Update 2002-03
// 0 !HISTORY 2003-07-03 [Steffen] Subfiled for patterning
// 0 !HISTORY 2003-12-19 [PTadmin] Official Update 2003-03
// 0 !HISTORY 2007-06-06 [PTadmin] Header formatted for Contributor Agreement
// 0 !HISTORY 2008-07-01 [PTadmin] Official Update 2008-01
// 
// 
// 1 16 0 0 0 1 0 0 0 1 0 0 0 1 s\3009s01.dat
  [1,16,0,0,0,1,0,0,0,1,0,0,0,1, ldraw_lib__s__3009s01()],
// 4 16 -60 0 -10 -60 24 -10 60 24 -10 60 0 -10
  [4,16,-60,0,-10,-60,24,-10,60,24,-10,60,0,-10],
// 0
];
module ldraw_lib__3009(step=0, col=false, unit=2/5, alt=false, line=0.2, solid=!$preview)
    makepoly(ldraw_lib__3009(), step=step, col=col, unit=unit, alt=alt, line=line, solid=solid);
ldraw_lib__3009(line=0.2);
// main file
use <../lib.scad>
use <164555c.scad>
use <3009.scad>
function ldraw_lib__3009d0r() = [
// 0 Brick  1 x  6 with Black Waiting Room Sticker
// 0 Name: 3009d0r.dat
// 0 Author: Takeshi Takahashi [RainbowDolphin]
// 0 !LDRAW_ORG Shortcut UPDATE 2024-07
// 0 !LICENSE Licensed under CC BY 4.0 : see CAreadme.txt
// 
// 0 BFC CERTIFY CCW
  [0,"BFC","CERTIFY"],
  [0,"BFC","CCW"],
// 
// 0 !CATEGORY Sticker Shortcut
// 0 !KEYWORDS Bricklink 3009pb166, Metro station, Set 4554
// 
// 0 !HISTORY 2024-08-26 [OrionP] Official Update 2024-07
// 
// 1 16 0 0 0 1 0 0 0 1 0 0 0 1 3009.dat
  [1,16,0,0,0,1,0,0,0,1,0,0,0,1, ldraw_lib__3009()],
// 1 16 0 12 -10 1 0 0 0 0 -1 0 1 0 164555c.dat
  [1,16,0,12,-10,1,0,0,0,0,-1,0,1,0, ldraw_lib__164555c()],
];
module ldraw_lib__3009d0r(step=0, col=false, unit=2/5, alt=false, line=0.2, solid=!$preview)
    makepoly(ldraw_lib__3009d0r(), step=step, col=col, unit=unit, alt=alt, line=line, solid=solid);
ldraw_lib__3009d0r(line=0.2);
